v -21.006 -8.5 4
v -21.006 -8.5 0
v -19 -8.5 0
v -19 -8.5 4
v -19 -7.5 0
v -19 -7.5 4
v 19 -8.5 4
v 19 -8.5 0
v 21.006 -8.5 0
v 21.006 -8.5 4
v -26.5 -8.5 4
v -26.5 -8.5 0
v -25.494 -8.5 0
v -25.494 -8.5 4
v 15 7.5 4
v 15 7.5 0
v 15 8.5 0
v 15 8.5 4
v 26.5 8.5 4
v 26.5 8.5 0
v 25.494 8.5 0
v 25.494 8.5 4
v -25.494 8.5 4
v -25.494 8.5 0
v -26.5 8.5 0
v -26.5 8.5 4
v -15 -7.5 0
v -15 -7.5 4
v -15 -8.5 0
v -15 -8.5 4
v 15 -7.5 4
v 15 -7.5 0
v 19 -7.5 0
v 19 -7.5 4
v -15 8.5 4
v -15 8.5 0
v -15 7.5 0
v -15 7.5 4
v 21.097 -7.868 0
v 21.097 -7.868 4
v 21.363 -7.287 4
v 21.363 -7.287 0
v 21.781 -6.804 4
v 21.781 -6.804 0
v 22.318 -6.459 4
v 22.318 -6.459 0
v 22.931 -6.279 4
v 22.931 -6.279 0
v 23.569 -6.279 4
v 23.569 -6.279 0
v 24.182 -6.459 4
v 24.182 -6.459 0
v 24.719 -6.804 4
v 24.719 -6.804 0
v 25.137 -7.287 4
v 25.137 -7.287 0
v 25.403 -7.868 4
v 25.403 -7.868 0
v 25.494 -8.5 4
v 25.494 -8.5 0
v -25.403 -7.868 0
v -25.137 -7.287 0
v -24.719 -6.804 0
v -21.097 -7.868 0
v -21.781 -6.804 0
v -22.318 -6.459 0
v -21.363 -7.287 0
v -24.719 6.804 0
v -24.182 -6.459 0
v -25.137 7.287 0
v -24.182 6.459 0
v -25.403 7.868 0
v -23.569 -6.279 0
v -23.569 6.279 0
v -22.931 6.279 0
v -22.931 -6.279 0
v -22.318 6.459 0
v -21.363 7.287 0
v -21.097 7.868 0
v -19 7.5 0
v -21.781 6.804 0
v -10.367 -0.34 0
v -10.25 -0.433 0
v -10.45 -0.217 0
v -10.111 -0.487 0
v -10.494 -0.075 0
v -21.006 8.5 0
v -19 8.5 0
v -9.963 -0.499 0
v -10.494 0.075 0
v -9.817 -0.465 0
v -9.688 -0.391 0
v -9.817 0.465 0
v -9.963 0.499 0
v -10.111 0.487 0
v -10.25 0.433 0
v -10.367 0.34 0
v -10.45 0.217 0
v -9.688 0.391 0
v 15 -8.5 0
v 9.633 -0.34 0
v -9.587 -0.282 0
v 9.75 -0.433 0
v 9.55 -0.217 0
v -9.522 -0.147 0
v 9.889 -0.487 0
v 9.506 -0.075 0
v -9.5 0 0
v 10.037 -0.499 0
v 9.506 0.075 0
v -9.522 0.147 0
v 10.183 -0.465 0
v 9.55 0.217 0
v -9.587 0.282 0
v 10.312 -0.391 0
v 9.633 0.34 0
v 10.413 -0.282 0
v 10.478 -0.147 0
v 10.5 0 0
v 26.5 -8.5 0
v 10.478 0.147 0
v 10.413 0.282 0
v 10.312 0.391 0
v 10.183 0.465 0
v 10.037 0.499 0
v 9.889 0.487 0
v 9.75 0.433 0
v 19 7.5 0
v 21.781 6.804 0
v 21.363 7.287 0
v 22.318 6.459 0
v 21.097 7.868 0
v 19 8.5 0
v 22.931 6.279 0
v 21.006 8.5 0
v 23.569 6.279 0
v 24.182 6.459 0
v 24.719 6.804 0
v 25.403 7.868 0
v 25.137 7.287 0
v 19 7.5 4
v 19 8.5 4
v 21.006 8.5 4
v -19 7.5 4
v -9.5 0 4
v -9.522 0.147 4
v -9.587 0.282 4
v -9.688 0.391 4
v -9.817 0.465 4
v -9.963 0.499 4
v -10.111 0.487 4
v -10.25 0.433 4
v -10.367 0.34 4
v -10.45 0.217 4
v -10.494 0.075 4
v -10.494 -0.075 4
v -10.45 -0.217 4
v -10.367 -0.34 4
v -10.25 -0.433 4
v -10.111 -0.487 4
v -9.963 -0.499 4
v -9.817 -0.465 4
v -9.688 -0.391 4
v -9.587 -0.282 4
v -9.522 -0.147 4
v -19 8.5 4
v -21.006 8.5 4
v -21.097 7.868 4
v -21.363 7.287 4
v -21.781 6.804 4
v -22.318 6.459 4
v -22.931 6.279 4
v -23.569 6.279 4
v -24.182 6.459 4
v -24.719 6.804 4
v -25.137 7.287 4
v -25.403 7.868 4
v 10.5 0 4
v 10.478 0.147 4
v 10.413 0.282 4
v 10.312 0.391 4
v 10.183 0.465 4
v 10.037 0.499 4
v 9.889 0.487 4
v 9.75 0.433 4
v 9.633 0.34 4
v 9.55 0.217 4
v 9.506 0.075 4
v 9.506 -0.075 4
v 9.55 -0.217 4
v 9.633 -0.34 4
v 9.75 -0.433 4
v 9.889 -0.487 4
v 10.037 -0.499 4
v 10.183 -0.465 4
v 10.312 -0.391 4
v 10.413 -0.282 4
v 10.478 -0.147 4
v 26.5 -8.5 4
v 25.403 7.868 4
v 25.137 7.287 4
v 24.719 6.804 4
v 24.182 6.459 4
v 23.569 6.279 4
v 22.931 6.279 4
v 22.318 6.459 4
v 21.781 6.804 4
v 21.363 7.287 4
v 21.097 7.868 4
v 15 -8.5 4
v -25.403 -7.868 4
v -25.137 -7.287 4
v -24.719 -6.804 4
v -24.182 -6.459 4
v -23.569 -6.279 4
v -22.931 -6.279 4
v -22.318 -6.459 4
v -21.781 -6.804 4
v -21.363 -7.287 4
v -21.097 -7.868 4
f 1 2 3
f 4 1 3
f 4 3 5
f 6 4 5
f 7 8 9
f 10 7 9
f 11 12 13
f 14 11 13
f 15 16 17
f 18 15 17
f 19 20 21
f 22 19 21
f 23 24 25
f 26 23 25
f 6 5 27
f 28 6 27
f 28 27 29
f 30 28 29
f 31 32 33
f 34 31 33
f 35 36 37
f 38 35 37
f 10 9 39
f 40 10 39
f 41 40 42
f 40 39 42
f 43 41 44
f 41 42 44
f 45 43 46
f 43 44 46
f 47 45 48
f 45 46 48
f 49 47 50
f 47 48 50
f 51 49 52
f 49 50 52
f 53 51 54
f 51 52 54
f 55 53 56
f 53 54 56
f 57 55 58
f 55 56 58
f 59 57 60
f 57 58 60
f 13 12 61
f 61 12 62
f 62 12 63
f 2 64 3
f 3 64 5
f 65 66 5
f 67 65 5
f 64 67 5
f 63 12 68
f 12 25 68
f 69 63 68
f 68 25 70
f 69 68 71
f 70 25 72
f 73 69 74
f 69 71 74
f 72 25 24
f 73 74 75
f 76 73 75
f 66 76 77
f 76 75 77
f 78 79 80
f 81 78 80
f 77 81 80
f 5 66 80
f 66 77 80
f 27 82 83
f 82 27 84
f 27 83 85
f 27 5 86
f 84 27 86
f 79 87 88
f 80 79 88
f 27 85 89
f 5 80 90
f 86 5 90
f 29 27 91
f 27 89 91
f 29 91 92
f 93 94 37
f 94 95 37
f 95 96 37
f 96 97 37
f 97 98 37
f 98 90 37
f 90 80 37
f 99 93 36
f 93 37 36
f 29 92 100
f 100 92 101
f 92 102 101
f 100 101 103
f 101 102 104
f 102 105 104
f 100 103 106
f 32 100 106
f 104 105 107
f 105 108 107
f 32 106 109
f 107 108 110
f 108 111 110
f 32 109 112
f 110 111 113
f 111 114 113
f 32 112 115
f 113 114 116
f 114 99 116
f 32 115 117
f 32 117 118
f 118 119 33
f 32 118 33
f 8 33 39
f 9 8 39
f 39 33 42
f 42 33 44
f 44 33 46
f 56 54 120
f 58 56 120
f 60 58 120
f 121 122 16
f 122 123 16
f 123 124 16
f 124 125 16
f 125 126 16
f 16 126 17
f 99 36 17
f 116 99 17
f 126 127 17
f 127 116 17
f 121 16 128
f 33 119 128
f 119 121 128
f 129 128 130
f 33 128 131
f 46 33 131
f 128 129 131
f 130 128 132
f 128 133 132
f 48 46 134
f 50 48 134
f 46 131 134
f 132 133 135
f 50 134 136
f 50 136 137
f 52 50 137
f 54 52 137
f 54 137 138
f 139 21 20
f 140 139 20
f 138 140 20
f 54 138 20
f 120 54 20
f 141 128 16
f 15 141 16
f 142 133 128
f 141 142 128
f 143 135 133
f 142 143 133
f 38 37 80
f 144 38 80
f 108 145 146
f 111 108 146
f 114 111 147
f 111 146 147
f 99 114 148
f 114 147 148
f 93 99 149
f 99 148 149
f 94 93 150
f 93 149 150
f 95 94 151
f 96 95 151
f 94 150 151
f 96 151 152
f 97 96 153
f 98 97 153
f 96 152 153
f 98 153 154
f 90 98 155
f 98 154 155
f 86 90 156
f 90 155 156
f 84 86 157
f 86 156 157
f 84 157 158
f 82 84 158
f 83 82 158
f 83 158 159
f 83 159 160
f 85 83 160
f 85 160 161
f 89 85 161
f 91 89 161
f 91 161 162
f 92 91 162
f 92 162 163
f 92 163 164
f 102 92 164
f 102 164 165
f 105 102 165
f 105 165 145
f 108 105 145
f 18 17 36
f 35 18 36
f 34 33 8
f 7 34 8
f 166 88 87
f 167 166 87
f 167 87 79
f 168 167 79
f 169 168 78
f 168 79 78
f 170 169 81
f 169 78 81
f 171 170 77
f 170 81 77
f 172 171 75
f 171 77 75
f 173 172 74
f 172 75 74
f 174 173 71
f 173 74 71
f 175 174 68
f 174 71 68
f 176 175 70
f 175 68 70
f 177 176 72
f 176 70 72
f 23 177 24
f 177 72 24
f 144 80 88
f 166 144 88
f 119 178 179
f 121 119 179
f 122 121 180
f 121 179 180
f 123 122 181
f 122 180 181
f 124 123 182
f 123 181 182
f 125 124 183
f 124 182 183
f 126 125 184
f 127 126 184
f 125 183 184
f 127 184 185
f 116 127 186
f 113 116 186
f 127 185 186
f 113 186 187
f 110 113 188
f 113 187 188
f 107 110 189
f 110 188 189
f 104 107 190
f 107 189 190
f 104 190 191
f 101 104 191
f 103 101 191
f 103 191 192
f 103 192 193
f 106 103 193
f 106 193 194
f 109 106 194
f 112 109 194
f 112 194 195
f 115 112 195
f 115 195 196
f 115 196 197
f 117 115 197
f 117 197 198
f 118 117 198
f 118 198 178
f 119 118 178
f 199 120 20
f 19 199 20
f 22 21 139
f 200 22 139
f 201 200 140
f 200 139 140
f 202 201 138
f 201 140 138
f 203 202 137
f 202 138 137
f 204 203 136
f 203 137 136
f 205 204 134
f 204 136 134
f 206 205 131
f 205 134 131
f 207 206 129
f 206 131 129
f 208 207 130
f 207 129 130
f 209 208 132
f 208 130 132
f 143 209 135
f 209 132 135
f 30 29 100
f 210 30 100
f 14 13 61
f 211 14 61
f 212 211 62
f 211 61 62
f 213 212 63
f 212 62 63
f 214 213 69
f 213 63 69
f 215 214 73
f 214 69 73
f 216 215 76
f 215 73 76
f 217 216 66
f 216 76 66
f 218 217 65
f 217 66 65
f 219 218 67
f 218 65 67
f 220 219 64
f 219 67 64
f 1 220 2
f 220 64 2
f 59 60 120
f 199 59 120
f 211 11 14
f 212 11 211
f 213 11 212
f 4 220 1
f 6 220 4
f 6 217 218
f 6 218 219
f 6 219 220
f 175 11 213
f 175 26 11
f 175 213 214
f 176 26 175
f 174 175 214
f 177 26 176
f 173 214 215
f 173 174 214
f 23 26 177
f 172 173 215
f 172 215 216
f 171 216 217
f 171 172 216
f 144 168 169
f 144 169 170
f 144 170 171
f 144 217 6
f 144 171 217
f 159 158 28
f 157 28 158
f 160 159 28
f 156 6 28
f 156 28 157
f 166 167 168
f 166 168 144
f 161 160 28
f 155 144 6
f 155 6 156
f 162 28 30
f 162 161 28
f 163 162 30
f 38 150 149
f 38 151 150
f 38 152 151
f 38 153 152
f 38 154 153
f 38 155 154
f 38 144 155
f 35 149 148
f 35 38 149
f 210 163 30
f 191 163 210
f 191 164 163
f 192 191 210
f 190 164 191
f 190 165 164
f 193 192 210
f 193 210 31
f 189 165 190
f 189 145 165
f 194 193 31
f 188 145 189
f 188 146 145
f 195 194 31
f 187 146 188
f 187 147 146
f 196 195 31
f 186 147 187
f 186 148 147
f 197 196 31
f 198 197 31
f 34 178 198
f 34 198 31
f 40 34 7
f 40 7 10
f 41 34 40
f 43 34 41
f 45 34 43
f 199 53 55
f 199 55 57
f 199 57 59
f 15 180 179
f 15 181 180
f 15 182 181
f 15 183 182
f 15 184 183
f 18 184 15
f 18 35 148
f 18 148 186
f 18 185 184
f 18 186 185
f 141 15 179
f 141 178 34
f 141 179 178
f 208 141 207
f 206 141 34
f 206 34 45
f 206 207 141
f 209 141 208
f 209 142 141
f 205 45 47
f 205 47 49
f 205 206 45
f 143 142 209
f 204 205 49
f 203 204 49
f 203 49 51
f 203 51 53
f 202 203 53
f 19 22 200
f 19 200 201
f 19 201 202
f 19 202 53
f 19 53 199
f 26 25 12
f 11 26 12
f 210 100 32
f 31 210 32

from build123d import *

# Parameters (mm, degrees)
AUFSATZ_LINEAR_AUSTRAGEN1_DEPTH = 4
SCHNITT_LINEAR_AUSTRAGEN1_REACH = 6
SKIZZE2_R                       = 0.5


with BuildPart() as part:
    # Skizze1 → Aufsatz-Linear austragen1 (new body)
    with BuildSketch(Plane.XY):
        with BuildLine():
            Line((26.5, 8.5), (25.493621062, 8.5))
            ThreePointArc((25.493621062, 8.5), (23.25, 6.256378938), (21.006378938, 8.5))
            Line((21.006378938, 8.5), (19, 8.5))
            Line((19, 8.5), (19, 7.5))
            Line((19, 7.5), (15, 7.5))
            Line((15, 7.5), (15, 8.5))
            Line((15, 8.5), (-15, 8.5))
            Line((-15, 8.5), (-15, 7.5))
            Line((-15, 7.5), (-19, 7.5))
            Line((-19, 7.5), (-19, 8.5))
            Line((-19, 8.5), (-21.006378938, 8.5))
            ThreePointArc((-21.006378938, 8.5), (-23.25, 6.256378938), (-25.493621062, 8.5))
            Line((-25.493621062, 8.5), (-26.5, 8.5))
            Line((-26.5, 8.5), (-26.5, -8.5))
            Line((-26.5, -8.5), (-25.493621062, -8.5))
            ThreePointArc((-25.493621062, -8.5), (-23.25, -6.256378938), (-21.006378938, -8.5))
            Line((-21.006378938, -8.5), (-19, -8.5))
            Line((-19, -8.5), (-19, -7.5))
            Line((-19, -7.5), (-15, -7.5))
            Line((-15, -7.5), (-15, -8.5))
            Line((-15, -8.5), (15, -8.5))
            Line((15, -8.5), (15, -7.5))
            Line((15, -7.5), (19, -7.5))
            Line((19, -7.5), (19, -8.5))
            Line((19, -8.5), (21.006378938, -8.5))
            ThreePointArc((21.006378938, -8.5), (23.25, -6.256378938), (25.493621062, -8.5))
            Line((25.493621062, -8.5), (26.5, -8.5))
            Line((26.5, -8.5), (26.5, 8.5))
        make_face()
    extrude(amount=AUFSATZ_LINEAR_AUSTRAGEN1_DEPTH)

    # Skizze2 → Schnitt-Linear austragen1 (cut, up to next)
    with BuildSketch(Plane.XY.offset(4), mode=Mode.PRIVATE) as schnitt_linear_austragen1_sk1:
        with Locations((-10, 0)):
            Circle(SKIZZE2_R)
    schnitt_linear_austragen1_tool1 = extrude(schnitt_linear_austragen1_sk1.sketch, amount=-SCHNITT_LINEAR_AUSTRAGEN1_REACH, mode=Mode.PRIVATE) & part.part
    add(schnitt_linear_austragen1_tool1.solids().sort_by_distance((-10, 0, 4))[0], mode=Mode.SUBTRACT)
    # Skizze2 → Schnitt-Linear austragen1 (cut, up to next)
    with BuildSketch(Plane.XY.offset(4), mode=Mode.PRIVATE) as schnitt_linear_austragen1_sk2:
        with Locations((10, 0)):
            Circle(SKIZZE2_R)
    schnitt_linear_austragen1_tool2 = extrude(schnitt_linear_austragen1_sk2.sketch, amount=-SCHNITT_LINEAR_AUSTRAGEN1_REACH, mode=Mode.PRIVATE) & part.part
    add(schnitt_linear_austragen1_tool2.solids().sort_by_distance((10, 0, 4))[0], mode=Mode.SUBTRACT)


solid = part.part
